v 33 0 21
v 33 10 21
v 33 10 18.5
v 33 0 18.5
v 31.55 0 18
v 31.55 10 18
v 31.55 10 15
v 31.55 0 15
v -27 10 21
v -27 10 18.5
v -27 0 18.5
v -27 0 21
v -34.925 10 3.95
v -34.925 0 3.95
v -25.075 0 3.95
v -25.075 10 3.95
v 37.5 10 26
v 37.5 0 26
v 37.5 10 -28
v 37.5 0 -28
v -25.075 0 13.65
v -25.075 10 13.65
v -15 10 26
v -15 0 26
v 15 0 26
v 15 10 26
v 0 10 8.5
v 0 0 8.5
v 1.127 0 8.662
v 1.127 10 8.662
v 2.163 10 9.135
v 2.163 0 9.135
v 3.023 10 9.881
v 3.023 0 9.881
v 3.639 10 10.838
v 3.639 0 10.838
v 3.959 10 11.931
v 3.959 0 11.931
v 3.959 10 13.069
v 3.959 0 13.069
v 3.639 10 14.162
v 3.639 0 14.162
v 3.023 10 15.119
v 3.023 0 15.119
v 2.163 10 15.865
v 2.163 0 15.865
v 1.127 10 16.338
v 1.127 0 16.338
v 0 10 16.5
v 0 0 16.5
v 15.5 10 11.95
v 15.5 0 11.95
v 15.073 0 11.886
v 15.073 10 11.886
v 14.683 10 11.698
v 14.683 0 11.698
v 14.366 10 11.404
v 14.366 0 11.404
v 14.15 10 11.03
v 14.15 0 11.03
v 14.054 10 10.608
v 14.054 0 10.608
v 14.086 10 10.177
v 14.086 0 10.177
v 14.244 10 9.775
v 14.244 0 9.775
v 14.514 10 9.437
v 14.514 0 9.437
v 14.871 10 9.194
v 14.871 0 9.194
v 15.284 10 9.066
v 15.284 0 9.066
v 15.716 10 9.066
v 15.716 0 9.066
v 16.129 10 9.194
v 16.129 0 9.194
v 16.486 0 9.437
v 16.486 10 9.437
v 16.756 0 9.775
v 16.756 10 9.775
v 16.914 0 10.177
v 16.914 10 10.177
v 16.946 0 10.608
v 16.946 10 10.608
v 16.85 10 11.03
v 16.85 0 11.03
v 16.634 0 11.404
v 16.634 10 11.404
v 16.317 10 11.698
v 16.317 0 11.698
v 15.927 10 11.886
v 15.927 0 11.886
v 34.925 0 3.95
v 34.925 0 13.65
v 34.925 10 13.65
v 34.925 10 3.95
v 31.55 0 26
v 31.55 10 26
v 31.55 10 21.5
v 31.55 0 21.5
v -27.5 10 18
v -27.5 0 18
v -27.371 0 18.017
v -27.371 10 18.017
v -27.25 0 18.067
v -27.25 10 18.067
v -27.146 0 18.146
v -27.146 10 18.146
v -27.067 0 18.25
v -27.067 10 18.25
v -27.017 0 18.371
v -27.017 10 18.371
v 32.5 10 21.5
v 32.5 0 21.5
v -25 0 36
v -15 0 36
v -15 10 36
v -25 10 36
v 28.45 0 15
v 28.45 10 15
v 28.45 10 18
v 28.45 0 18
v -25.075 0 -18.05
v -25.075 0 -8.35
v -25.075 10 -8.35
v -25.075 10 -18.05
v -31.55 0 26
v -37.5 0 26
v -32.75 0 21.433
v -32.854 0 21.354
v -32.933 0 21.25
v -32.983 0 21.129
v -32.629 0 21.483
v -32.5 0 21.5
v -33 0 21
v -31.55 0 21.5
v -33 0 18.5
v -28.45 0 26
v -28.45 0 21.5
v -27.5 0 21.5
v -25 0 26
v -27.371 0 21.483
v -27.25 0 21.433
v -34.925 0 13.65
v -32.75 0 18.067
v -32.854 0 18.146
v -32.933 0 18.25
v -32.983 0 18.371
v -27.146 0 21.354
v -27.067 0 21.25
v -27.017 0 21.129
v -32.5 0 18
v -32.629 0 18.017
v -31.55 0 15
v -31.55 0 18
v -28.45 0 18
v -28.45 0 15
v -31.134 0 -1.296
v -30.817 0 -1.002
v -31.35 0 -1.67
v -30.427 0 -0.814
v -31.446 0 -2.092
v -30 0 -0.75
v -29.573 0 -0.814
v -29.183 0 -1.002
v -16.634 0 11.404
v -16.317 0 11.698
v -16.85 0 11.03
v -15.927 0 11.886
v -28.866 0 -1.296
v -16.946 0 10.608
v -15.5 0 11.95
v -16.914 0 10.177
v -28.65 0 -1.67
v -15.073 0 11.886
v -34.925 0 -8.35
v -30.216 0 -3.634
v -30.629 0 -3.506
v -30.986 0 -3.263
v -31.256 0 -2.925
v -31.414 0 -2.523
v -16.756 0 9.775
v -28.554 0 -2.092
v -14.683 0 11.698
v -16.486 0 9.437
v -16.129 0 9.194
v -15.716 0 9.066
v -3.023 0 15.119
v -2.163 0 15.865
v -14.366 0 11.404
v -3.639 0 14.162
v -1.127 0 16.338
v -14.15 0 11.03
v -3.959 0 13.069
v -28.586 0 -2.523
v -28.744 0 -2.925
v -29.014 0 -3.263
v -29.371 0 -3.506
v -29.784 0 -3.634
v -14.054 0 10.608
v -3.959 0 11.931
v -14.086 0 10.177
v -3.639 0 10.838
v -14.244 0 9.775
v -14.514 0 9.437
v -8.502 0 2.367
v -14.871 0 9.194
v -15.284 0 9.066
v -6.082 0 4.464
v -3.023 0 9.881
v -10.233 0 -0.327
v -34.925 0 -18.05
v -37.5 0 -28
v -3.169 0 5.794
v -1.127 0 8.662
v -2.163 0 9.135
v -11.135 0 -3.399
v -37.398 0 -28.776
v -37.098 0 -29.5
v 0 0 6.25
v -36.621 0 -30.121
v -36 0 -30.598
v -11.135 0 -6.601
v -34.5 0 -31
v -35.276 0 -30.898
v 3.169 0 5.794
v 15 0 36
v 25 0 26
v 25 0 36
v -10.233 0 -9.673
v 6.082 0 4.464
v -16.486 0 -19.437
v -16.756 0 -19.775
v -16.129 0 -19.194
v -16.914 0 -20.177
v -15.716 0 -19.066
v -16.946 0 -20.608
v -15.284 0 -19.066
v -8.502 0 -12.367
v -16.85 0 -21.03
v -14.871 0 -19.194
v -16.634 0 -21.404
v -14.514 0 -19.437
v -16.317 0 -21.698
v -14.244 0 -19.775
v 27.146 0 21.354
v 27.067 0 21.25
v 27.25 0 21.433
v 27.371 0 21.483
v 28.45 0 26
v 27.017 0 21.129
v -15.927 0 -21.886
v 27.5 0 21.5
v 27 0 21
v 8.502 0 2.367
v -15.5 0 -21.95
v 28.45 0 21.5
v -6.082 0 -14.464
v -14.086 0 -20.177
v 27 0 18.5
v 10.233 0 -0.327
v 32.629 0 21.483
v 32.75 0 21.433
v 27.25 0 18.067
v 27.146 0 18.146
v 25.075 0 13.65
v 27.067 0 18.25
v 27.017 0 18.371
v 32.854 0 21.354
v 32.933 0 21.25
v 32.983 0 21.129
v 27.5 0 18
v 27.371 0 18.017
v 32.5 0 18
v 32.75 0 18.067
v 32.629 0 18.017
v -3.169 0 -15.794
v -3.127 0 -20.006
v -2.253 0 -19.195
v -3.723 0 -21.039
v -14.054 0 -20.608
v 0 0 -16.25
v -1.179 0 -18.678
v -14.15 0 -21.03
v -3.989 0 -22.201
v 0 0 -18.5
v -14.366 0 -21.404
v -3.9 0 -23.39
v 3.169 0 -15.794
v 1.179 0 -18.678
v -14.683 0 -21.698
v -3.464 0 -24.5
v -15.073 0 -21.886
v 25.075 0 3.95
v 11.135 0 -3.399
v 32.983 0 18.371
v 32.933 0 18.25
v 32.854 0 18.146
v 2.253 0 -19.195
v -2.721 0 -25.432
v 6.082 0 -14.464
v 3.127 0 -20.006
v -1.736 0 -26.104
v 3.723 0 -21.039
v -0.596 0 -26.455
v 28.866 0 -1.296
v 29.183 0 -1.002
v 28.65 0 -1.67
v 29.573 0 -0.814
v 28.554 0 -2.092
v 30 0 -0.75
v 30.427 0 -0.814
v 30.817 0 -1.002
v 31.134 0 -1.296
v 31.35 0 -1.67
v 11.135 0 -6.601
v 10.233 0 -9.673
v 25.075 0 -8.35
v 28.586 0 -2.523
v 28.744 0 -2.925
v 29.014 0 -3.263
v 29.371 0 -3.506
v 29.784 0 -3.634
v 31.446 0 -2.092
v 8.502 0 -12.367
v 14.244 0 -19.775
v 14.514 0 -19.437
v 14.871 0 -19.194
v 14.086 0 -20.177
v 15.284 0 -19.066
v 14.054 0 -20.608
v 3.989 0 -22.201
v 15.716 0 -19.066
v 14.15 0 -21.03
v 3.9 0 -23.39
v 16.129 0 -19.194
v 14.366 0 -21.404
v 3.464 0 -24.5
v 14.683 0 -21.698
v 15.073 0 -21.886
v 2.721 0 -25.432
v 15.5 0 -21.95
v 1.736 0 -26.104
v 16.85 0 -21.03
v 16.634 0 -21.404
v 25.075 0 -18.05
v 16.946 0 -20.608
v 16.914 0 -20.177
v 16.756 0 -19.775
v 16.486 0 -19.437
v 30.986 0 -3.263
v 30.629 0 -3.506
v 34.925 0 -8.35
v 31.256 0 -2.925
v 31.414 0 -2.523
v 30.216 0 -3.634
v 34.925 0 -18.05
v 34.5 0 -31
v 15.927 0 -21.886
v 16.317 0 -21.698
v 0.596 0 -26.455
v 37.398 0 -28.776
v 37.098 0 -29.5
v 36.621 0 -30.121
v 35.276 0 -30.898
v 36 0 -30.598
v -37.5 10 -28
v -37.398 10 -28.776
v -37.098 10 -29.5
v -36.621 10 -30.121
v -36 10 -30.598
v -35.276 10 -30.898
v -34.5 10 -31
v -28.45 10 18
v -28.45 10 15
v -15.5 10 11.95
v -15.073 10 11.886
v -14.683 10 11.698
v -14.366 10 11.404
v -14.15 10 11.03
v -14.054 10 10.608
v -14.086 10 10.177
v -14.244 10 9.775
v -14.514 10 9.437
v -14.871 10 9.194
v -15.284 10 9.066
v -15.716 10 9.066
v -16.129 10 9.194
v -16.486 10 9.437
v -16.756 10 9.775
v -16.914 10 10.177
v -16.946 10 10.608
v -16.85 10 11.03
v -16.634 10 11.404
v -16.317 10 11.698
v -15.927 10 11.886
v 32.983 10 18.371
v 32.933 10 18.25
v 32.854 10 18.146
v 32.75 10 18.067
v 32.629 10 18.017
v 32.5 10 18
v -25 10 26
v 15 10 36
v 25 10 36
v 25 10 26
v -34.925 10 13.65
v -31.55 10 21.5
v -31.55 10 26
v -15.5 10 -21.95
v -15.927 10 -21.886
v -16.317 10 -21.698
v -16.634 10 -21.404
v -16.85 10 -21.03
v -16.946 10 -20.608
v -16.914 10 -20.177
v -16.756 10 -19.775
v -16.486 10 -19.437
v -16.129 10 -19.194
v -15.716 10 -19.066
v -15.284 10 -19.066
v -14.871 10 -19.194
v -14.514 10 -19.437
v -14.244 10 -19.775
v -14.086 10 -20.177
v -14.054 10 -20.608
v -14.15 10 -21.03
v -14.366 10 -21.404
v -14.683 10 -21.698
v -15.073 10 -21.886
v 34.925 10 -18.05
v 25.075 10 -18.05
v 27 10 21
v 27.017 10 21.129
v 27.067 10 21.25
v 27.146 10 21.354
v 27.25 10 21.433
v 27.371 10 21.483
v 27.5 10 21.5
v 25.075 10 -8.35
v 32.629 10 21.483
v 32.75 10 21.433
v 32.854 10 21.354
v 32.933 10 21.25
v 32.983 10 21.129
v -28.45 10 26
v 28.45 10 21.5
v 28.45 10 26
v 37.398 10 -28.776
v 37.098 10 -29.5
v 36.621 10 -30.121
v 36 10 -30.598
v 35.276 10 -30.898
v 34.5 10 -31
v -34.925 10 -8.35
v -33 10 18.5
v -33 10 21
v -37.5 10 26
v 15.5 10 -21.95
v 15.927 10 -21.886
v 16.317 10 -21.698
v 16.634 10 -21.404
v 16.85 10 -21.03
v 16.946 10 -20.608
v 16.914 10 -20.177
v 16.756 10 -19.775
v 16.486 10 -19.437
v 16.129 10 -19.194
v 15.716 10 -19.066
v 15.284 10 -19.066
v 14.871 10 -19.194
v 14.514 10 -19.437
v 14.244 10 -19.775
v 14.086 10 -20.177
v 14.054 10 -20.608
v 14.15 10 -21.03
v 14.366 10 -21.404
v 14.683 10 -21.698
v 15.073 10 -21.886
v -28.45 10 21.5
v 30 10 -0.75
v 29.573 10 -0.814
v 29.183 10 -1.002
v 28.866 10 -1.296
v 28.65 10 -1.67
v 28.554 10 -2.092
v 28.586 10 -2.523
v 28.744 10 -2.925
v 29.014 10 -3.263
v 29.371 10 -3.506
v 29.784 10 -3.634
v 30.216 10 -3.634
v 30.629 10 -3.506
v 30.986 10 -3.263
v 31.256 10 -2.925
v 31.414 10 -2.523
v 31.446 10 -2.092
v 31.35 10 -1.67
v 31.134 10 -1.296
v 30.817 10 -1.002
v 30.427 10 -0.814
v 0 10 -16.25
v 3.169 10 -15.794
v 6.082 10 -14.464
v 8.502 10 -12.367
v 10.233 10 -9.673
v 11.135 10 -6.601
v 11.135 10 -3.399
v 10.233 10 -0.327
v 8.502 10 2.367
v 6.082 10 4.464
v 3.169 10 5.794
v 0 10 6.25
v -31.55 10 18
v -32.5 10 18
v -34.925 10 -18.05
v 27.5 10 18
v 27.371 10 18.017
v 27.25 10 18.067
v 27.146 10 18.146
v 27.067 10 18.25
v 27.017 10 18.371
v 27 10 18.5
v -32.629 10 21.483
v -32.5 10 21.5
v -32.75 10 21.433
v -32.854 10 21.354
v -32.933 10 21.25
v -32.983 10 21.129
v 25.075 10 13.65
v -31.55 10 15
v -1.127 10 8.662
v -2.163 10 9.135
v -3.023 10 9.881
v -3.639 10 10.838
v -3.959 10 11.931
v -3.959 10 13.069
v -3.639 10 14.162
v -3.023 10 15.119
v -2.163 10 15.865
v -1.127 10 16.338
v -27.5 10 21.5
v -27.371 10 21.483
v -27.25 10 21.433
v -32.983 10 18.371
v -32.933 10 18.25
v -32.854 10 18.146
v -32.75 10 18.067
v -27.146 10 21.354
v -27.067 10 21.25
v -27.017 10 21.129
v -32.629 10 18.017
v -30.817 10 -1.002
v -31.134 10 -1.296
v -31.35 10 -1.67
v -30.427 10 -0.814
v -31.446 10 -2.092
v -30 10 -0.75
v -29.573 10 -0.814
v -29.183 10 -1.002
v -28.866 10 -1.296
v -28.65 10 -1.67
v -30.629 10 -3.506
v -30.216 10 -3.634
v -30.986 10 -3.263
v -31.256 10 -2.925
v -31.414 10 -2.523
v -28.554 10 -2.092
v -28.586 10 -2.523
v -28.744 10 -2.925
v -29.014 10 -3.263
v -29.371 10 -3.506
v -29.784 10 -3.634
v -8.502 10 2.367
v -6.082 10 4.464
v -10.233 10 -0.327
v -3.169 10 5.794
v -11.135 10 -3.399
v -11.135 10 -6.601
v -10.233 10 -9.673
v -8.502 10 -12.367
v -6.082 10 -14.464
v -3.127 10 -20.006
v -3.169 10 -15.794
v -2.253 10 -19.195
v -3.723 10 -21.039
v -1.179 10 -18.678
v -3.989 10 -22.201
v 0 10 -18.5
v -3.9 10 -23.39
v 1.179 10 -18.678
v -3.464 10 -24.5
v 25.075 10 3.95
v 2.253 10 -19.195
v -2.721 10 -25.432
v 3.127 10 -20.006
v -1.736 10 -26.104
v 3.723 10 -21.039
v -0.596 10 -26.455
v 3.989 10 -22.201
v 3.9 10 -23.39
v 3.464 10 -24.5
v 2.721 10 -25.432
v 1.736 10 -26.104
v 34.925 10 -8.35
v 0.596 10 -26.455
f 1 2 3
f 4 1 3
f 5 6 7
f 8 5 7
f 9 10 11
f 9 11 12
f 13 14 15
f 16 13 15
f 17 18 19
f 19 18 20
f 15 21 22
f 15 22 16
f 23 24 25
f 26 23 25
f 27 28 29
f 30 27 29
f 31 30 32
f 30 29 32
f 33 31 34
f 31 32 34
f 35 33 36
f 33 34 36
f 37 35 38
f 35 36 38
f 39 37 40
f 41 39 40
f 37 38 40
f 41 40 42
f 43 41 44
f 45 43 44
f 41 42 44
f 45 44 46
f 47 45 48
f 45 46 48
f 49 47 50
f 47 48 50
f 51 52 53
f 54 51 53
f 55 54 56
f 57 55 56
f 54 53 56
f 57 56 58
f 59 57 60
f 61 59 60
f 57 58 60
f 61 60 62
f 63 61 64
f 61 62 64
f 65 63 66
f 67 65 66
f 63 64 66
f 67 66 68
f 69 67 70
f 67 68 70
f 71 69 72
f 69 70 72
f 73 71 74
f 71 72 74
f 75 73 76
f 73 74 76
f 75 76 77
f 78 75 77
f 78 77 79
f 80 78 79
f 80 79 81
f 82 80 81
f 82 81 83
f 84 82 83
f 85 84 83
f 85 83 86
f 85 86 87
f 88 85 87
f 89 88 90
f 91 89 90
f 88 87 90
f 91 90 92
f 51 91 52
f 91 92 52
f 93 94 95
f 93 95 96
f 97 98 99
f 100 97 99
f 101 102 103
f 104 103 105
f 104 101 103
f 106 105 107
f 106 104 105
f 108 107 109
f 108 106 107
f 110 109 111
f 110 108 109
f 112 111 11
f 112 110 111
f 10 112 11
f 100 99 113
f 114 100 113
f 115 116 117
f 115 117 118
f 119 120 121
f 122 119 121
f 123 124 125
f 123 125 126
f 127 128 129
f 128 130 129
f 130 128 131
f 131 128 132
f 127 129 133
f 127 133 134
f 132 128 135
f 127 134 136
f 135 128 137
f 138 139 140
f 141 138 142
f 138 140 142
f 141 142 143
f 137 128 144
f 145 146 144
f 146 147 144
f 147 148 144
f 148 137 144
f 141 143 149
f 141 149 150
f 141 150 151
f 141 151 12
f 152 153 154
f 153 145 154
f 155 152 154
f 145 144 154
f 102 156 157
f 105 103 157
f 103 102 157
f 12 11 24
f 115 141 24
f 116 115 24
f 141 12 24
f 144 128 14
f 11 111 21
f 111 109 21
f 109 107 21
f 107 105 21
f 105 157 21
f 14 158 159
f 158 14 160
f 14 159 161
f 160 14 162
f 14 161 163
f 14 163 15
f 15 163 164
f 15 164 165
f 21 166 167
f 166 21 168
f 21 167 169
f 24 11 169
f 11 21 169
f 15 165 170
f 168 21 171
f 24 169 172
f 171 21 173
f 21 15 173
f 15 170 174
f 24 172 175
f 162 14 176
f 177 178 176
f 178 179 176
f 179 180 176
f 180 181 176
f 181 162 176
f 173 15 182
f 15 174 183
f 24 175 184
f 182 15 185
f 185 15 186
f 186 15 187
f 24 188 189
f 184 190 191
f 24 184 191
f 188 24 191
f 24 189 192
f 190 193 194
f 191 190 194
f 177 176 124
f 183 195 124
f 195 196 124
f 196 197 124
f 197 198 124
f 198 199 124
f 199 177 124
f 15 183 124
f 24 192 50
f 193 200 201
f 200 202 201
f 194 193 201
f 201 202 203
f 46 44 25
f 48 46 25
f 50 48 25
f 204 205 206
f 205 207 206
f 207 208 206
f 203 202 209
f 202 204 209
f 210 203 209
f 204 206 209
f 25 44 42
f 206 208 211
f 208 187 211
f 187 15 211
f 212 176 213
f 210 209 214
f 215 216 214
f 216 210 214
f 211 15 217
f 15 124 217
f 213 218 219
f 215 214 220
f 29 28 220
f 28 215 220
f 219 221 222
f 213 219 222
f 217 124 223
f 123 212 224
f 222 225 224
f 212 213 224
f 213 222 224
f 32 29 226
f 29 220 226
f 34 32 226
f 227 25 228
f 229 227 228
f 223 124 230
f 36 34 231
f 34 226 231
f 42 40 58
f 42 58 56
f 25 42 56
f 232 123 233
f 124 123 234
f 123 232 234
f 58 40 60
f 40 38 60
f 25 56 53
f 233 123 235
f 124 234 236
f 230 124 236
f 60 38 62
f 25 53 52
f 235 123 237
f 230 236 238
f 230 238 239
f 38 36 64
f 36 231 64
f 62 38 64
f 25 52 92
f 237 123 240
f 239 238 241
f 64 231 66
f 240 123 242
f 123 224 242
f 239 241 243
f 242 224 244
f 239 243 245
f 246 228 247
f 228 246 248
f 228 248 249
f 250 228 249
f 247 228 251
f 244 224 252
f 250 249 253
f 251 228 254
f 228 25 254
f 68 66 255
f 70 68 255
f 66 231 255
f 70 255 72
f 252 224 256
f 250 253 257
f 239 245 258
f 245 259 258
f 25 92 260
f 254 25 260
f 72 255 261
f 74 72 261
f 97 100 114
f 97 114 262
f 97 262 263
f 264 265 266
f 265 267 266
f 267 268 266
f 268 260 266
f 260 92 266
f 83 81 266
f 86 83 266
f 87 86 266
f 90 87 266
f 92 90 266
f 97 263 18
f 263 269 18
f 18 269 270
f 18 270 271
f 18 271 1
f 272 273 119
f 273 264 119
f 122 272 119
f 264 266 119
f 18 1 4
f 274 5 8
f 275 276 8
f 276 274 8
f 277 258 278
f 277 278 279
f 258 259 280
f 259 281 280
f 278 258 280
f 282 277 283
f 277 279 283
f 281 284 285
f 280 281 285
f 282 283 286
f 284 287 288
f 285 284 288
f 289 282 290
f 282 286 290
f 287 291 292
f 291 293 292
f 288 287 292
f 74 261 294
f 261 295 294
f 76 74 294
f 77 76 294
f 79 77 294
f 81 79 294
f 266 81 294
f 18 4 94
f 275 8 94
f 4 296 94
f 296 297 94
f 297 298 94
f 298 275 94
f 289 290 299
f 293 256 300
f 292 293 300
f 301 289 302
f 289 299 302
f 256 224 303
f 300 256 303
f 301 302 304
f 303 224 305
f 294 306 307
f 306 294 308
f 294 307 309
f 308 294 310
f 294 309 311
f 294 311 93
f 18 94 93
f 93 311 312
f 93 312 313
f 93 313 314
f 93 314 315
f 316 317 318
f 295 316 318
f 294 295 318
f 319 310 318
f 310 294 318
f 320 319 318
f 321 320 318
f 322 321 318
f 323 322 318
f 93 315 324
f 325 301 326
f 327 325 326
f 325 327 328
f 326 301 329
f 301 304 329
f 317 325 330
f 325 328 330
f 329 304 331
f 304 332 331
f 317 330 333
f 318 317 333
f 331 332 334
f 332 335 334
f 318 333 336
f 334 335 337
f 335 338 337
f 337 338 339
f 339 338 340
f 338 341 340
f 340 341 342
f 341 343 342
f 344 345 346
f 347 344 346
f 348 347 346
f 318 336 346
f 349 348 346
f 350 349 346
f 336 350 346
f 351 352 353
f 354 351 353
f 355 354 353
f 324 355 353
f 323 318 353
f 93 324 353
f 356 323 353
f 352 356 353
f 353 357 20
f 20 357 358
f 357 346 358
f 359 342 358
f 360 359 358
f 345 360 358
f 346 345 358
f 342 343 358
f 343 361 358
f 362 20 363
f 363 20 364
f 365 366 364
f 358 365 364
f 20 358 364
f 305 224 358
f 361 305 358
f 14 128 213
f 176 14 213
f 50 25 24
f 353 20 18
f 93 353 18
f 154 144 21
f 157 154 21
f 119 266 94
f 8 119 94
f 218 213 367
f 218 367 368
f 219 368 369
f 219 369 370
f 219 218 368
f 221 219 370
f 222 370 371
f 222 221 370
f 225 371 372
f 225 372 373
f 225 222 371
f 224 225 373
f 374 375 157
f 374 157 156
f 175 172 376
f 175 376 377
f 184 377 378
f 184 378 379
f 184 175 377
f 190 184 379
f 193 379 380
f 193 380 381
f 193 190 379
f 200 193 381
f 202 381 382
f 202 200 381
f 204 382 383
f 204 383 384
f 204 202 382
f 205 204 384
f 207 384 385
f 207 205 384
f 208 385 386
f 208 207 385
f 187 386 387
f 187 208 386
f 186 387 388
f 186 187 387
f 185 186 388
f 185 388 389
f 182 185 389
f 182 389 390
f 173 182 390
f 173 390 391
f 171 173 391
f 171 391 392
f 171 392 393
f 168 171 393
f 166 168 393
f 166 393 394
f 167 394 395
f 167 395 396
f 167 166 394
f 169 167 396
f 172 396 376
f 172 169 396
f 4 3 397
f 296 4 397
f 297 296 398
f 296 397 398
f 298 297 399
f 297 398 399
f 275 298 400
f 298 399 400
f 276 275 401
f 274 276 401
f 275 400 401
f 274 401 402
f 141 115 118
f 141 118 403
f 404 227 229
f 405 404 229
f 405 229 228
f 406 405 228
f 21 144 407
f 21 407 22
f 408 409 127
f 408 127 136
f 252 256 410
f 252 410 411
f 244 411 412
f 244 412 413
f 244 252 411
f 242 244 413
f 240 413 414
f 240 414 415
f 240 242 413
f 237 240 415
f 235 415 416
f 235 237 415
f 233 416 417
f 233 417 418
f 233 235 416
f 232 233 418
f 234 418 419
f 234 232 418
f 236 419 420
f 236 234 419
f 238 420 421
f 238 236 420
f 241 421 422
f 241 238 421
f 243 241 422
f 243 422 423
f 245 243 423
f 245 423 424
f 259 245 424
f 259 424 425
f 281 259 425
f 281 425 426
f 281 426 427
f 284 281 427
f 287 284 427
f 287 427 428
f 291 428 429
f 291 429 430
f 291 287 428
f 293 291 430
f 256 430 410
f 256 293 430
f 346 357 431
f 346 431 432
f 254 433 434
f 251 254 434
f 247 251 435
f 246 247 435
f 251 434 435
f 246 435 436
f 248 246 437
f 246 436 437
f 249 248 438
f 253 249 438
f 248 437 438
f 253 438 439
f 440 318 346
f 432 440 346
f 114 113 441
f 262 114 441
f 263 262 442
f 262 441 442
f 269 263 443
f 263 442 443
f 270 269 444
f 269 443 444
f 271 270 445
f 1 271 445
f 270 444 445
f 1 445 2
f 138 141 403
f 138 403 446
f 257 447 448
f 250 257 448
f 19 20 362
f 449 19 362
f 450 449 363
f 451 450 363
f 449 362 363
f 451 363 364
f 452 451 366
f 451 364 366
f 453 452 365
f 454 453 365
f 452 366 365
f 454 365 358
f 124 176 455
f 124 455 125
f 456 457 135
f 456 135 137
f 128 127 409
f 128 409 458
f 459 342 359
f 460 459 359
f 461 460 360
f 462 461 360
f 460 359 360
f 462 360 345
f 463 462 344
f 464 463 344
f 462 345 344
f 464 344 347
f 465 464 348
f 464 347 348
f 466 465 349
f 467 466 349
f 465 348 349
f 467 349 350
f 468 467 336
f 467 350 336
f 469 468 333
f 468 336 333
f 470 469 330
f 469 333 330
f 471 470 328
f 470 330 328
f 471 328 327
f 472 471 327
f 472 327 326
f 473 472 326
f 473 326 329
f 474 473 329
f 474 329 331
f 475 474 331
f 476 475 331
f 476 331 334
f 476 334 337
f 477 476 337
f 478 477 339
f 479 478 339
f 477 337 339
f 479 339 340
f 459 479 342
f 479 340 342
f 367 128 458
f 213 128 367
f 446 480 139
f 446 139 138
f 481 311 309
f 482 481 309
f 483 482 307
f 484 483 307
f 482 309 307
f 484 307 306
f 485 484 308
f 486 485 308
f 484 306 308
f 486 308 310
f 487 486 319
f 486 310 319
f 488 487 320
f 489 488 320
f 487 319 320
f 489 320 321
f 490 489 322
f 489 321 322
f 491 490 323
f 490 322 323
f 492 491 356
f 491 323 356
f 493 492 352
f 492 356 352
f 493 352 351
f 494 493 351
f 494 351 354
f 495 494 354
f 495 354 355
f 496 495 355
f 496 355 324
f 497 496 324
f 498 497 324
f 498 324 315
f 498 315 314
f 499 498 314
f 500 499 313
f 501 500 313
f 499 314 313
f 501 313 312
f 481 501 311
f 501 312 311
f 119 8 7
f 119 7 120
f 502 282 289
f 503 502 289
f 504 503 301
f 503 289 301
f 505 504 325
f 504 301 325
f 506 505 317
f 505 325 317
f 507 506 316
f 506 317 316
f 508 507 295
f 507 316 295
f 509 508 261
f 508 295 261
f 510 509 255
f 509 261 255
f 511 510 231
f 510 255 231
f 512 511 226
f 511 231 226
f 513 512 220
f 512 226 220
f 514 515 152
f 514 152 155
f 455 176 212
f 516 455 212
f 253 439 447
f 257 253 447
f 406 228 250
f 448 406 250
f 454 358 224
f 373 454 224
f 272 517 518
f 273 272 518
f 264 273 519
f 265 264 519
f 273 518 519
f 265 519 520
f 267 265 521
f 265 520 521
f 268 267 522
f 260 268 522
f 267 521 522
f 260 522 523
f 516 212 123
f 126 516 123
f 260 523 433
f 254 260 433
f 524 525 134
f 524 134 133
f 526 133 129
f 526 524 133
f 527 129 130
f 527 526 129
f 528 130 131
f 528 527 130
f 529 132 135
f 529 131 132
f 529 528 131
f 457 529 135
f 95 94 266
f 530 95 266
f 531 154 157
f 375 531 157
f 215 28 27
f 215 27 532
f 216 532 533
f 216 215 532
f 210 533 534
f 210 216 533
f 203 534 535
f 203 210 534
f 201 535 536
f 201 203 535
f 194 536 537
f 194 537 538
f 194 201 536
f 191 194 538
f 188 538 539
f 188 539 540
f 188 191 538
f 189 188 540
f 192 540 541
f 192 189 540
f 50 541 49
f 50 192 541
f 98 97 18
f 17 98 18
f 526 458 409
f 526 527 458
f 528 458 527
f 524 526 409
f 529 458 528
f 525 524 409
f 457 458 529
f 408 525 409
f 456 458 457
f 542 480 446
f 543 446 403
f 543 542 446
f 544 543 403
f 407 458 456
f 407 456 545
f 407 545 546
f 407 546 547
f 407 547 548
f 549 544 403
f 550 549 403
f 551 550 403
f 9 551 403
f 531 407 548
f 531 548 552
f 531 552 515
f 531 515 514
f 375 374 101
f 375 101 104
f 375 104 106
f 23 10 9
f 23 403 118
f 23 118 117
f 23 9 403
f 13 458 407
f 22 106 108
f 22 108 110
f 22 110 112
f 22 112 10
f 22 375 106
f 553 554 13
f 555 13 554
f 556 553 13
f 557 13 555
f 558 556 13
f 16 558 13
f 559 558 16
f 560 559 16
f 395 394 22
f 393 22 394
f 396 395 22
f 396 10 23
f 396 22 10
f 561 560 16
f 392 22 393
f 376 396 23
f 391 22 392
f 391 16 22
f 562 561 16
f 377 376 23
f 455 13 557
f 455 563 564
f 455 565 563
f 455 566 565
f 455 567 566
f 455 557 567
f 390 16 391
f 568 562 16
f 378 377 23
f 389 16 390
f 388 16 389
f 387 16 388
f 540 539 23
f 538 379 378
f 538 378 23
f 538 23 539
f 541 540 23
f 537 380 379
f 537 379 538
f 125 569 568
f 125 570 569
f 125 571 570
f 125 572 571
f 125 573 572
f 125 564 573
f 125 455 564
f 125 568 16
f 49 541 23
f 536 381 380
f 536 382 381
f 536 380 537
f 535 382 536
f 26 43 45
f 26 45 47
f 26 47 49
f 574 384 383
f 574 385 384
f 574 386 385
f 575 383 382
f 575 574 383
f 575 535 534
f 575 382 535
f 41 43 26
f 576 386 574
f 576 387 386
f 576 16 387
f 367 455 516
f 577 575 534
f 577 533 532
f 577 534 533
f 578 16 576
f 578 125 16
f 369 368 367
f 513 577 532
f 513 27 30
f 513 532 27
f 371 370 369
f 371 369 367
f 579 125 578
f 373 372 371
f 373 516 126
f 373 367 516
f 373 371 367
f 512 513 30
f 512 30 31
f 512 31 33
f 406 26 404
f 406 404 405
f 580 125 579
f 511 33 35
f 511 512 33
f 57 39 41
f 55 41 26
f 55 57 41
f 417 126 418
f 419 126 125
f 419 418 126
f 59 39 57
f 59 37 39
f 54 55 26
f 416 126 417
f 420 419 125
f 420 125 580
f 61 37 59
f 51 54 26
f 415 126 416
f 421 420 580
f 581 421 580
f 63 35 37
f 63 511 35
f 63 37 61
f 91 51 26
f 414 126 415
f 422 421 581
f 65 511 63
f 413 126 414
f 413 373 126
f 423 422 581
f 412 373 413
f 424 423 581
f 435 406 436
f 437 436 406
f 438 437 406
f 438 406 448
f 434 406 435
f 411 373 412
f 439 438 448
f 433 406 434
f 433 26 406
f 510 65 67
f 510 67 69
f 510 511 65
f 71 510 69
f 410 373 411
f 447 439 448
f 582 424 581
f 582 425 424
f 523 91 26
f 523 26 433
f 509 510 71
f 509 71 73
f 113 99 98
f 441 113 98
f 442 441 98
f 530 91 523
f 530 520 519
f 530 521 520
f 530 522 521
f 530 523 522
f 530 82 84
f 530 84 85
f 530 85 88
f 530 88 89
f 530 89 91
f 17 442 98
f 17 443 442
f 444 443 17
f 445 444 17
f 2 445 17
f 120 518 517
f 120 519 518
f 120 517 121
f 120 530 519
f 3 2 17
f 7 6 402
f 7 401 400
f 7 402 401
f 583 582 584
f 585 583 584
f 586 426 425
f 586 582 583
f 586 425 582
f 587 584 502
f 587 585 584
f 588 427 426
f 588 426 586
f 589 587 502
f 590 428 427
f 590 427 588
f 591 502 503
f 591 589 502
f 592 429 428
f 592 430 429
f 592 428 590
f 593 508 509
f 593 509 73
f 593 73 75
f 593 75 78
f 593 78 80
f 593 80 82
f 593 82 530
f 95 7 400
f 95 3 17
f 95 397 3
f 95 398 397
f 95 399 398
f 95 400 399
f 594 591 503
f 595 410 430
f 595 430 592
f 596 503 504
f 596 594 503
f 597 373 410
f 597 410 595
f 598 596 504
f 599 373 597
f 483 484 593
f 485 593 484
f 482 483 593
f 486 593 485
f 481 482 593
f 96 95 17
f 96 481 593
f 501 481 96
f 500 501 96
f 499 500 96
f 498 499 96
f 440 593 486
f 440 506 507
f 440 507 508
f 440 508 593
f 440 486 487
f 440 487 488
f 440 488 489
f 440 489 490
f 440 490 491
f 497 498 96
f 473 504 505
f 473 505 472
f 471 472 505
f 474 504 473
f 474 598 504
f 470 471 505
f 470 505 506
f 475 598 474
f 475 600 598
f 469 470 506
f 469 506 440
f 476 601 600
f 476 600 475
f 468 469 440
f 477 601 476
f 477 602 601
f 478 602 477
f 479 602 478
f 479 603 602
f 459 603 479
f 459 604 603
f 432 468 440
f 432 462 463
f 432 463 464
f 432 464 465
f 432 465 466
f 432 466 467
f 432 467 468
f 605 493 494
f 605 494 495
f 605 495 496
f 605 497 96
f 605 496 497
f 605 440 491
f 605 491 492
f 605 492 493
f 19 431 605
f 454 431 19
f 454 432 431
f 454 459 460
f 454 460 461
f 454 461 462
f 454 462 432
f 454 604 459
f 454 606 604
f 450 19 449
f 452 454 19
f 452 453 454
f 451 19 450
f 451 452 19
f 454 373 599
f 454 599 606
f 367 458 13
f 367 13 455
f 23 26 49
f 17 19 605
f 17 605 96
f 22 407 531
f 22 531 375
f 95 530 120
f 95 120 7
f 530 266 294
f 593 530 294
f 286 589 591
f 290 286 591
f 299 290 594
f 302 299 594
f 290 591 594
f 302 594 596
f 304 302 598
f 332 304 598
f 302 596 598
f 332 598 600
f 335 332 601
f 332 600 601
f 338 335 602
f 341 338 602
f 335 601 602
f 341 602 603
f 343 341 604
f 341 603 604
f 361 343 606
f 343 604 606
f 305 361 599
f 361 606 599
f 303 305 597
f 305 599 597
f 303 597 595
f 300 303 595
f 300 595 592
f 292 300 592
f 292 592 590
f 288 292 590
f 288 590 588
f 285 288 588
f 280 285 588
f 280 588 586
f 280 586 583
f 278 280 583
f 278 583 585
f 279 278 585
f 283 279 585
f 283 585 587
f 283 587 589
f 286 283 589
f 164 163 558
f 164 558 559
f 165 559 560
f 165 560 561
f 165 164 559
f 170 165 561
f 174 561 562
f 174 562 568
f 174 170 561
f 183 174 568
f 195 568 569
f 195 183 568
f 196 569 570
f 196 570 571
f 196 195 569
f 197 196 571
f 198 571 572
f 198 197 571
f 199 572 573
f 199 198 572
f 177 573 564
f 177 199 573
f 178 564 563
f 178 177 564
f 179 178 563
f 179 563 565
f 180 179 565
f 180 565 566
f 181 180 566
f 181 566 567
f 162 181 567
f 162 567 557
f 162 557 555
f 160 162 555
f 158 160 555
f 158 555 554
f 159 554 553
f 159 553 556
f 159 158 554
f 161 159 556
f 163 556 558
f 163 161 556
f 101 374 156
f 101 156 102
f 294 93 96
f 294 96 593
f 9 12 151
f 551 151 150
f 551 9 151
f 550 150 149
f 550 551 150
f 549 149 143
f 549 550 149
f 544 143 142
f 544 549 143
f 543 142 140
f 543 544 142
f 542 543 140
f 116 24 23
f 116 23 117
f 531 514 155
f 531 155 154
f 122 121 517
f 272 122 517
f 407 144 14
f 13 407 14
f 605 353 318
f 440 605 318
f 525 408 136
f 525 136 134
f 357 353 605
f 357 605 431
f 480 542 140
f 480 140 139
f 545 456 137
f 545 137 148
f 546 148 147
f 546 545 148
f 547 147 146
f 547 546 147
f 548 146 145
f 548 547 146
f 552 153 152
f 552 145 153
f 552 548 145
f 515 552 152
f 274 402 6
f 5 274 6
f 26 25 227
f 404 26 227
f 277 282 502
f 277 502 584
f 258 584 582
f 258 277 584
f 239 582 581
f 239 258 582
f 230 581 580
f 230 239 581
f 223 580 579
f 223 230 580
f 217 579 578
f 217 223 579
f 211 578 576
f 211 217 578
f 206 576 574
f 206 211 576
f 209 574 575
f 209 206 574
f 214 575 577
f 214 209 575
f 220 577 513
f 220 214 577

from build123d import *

# Parameters (mm, degrees)
SKETCH1_R          = 1.45
SKETCH1_W          = 9.85
SKETCH1_H          = 9.7
MAINLAYOUT_DEPTH   = 10
TSLOT_DEPTH        = 53.936282454
SKETCH3_R          = 4
CUT_EXTRUDE1_DEPTH = 53.936282454


with BuildPart() as part:
    # Sketch1 → MainLayout (new body)
    with BuildSketch(Plane(origin=(0, 0, 0), x_dir=(1, 0, 0), z_dir=(0, 1, 0))):
        with BuildLine():
            Line((-34.5, 31), (0, 31))
            Line((0, 31), (0, 16.25))
            ThreePointArc((0, 16.25), (-11.25, 5), (0, -6.25))
            Line((0, -6.25), (0, -8.5))
            ThreePointArc((0, -8.5), (-4, -12.5), (0, -16.5))
            Line((0, -16.5), (0, -26))
            Line((0, -26), (-15, -26))
            Line((-15, -26), (-15, -36))
            Line((-15, -36), (-25, -36))
            Line((-25, -36), (-25, -26))
            Line((-25, -26), (-37.5, -26))
            Line((-37.5, -26), (-37.5, 28))
            ThreePointArc((-37.5, 28), (-36.621320344, 30.121320344), (-34.5, 31))
        make_face()
        with Locations(Location((-15.5, 20.5, 0), (0, 0, 90))):
            Circle(SKETCH1_R, mode=Mode.SUBTRACT)
        with Locations(Location((-15.5, -10.5, 0), (0, 0, 270))):
            Circle(SKETCH1_R, mode=Mode.SUBTRACT)
        with Locations(Location((-30, 2.2, 0), (0, 0, 270))):
            Circle(SKETCH1_R, mode=Mode.SUBTRACT)
        with Locations((-30, 13.2)):
            Rectangle(SKETCH1_W, SKETCH1_H, mode=Mode.SUBTRACT)
        with Locations((-30, -8.8)):
            Rectangle(SKETCH1_W, SKETCH1_H, mode=Mode.SUBTRACT)
    mainlayout = extrude(amount=MAINLAYOUT_DEPTH)

    # Sketch2 → TSlot (cut, through all)
    with BuildSketch(Plane(origin=(0, 10, 0), x_dir=(1, 0, 0), z_dir=(0, 1, 0))):
        with BuildLine():
            Line((-28.45, -21.5), (-28.45, -26))
            Line((-28.45, -26), (-31.55, -26))
            Line((-31.55, -26), (-31.55, -21.5))
            Line((-31.55, -21.5), (-32.5, -21.5))
            ThreePointArc((-32.5, -21.5), (-32.853553391, -21.353553391), (-33, -21))
            Line((-33, -21), (-33, -18.5))
            ThreePointArc((-33, -18.5), (-32.853553391, -18.146446609), (-32.5, -18))
            Line((-32.5, -18), (-31.55, -18))
            Line((-31.55, -18), (-31.55, -15))
            Line((-31.55, -15), (-28.45, -15))
            Line((-28.45, -15), (-28.45, -18))
            Line((-28.45, -18), (-27.5, -18))
            ThreePointArc((-27.5, -18), (-27.146446609, -18.146446609), (-27, -18.5))
            Line((-27, -18.5), (-27, -21))
            ThreePointArc((-27, -21), (-27.146446609, -21.353553391), (-27.5, -21.5))
            Line((-27.5, -21.5), (-28.45, -21.5))
        make_face()
    tslot = extrude(amount=-TSLOT_DEPTH, mode=Mode.SUBTRACT)

    # Mirror1: MainLayout, TSlot across plane
    add(mainlayout.mirror(Plane(origin=(0, 0, 0), x_dir=(0, 0, 1), z_dir=(1, 0, 0))))
    add(tslot.mirror(Plane(origin=(0, 0, 0), x_dir=(0, 0, 1), z_dir=(1, 0, 0))), mode=Mode.SUBTRACT)

    # Sketch3 → Cut-Extrude1 (cut, through all)
    with BuildSketch(Plane(origin=(0, 10, 0), x_dir=(1, 0, 0), z_dir=(0, 1, 0))):
        with Locations(Location((0, 22.5, 0), (0, 0, 270))):
            Circle(SKETCH3_R)
    extrude(amount=-CUT_EXTRUDE1_DEPTH, mode=Mode.SUBTRACT)


solid = part.part
